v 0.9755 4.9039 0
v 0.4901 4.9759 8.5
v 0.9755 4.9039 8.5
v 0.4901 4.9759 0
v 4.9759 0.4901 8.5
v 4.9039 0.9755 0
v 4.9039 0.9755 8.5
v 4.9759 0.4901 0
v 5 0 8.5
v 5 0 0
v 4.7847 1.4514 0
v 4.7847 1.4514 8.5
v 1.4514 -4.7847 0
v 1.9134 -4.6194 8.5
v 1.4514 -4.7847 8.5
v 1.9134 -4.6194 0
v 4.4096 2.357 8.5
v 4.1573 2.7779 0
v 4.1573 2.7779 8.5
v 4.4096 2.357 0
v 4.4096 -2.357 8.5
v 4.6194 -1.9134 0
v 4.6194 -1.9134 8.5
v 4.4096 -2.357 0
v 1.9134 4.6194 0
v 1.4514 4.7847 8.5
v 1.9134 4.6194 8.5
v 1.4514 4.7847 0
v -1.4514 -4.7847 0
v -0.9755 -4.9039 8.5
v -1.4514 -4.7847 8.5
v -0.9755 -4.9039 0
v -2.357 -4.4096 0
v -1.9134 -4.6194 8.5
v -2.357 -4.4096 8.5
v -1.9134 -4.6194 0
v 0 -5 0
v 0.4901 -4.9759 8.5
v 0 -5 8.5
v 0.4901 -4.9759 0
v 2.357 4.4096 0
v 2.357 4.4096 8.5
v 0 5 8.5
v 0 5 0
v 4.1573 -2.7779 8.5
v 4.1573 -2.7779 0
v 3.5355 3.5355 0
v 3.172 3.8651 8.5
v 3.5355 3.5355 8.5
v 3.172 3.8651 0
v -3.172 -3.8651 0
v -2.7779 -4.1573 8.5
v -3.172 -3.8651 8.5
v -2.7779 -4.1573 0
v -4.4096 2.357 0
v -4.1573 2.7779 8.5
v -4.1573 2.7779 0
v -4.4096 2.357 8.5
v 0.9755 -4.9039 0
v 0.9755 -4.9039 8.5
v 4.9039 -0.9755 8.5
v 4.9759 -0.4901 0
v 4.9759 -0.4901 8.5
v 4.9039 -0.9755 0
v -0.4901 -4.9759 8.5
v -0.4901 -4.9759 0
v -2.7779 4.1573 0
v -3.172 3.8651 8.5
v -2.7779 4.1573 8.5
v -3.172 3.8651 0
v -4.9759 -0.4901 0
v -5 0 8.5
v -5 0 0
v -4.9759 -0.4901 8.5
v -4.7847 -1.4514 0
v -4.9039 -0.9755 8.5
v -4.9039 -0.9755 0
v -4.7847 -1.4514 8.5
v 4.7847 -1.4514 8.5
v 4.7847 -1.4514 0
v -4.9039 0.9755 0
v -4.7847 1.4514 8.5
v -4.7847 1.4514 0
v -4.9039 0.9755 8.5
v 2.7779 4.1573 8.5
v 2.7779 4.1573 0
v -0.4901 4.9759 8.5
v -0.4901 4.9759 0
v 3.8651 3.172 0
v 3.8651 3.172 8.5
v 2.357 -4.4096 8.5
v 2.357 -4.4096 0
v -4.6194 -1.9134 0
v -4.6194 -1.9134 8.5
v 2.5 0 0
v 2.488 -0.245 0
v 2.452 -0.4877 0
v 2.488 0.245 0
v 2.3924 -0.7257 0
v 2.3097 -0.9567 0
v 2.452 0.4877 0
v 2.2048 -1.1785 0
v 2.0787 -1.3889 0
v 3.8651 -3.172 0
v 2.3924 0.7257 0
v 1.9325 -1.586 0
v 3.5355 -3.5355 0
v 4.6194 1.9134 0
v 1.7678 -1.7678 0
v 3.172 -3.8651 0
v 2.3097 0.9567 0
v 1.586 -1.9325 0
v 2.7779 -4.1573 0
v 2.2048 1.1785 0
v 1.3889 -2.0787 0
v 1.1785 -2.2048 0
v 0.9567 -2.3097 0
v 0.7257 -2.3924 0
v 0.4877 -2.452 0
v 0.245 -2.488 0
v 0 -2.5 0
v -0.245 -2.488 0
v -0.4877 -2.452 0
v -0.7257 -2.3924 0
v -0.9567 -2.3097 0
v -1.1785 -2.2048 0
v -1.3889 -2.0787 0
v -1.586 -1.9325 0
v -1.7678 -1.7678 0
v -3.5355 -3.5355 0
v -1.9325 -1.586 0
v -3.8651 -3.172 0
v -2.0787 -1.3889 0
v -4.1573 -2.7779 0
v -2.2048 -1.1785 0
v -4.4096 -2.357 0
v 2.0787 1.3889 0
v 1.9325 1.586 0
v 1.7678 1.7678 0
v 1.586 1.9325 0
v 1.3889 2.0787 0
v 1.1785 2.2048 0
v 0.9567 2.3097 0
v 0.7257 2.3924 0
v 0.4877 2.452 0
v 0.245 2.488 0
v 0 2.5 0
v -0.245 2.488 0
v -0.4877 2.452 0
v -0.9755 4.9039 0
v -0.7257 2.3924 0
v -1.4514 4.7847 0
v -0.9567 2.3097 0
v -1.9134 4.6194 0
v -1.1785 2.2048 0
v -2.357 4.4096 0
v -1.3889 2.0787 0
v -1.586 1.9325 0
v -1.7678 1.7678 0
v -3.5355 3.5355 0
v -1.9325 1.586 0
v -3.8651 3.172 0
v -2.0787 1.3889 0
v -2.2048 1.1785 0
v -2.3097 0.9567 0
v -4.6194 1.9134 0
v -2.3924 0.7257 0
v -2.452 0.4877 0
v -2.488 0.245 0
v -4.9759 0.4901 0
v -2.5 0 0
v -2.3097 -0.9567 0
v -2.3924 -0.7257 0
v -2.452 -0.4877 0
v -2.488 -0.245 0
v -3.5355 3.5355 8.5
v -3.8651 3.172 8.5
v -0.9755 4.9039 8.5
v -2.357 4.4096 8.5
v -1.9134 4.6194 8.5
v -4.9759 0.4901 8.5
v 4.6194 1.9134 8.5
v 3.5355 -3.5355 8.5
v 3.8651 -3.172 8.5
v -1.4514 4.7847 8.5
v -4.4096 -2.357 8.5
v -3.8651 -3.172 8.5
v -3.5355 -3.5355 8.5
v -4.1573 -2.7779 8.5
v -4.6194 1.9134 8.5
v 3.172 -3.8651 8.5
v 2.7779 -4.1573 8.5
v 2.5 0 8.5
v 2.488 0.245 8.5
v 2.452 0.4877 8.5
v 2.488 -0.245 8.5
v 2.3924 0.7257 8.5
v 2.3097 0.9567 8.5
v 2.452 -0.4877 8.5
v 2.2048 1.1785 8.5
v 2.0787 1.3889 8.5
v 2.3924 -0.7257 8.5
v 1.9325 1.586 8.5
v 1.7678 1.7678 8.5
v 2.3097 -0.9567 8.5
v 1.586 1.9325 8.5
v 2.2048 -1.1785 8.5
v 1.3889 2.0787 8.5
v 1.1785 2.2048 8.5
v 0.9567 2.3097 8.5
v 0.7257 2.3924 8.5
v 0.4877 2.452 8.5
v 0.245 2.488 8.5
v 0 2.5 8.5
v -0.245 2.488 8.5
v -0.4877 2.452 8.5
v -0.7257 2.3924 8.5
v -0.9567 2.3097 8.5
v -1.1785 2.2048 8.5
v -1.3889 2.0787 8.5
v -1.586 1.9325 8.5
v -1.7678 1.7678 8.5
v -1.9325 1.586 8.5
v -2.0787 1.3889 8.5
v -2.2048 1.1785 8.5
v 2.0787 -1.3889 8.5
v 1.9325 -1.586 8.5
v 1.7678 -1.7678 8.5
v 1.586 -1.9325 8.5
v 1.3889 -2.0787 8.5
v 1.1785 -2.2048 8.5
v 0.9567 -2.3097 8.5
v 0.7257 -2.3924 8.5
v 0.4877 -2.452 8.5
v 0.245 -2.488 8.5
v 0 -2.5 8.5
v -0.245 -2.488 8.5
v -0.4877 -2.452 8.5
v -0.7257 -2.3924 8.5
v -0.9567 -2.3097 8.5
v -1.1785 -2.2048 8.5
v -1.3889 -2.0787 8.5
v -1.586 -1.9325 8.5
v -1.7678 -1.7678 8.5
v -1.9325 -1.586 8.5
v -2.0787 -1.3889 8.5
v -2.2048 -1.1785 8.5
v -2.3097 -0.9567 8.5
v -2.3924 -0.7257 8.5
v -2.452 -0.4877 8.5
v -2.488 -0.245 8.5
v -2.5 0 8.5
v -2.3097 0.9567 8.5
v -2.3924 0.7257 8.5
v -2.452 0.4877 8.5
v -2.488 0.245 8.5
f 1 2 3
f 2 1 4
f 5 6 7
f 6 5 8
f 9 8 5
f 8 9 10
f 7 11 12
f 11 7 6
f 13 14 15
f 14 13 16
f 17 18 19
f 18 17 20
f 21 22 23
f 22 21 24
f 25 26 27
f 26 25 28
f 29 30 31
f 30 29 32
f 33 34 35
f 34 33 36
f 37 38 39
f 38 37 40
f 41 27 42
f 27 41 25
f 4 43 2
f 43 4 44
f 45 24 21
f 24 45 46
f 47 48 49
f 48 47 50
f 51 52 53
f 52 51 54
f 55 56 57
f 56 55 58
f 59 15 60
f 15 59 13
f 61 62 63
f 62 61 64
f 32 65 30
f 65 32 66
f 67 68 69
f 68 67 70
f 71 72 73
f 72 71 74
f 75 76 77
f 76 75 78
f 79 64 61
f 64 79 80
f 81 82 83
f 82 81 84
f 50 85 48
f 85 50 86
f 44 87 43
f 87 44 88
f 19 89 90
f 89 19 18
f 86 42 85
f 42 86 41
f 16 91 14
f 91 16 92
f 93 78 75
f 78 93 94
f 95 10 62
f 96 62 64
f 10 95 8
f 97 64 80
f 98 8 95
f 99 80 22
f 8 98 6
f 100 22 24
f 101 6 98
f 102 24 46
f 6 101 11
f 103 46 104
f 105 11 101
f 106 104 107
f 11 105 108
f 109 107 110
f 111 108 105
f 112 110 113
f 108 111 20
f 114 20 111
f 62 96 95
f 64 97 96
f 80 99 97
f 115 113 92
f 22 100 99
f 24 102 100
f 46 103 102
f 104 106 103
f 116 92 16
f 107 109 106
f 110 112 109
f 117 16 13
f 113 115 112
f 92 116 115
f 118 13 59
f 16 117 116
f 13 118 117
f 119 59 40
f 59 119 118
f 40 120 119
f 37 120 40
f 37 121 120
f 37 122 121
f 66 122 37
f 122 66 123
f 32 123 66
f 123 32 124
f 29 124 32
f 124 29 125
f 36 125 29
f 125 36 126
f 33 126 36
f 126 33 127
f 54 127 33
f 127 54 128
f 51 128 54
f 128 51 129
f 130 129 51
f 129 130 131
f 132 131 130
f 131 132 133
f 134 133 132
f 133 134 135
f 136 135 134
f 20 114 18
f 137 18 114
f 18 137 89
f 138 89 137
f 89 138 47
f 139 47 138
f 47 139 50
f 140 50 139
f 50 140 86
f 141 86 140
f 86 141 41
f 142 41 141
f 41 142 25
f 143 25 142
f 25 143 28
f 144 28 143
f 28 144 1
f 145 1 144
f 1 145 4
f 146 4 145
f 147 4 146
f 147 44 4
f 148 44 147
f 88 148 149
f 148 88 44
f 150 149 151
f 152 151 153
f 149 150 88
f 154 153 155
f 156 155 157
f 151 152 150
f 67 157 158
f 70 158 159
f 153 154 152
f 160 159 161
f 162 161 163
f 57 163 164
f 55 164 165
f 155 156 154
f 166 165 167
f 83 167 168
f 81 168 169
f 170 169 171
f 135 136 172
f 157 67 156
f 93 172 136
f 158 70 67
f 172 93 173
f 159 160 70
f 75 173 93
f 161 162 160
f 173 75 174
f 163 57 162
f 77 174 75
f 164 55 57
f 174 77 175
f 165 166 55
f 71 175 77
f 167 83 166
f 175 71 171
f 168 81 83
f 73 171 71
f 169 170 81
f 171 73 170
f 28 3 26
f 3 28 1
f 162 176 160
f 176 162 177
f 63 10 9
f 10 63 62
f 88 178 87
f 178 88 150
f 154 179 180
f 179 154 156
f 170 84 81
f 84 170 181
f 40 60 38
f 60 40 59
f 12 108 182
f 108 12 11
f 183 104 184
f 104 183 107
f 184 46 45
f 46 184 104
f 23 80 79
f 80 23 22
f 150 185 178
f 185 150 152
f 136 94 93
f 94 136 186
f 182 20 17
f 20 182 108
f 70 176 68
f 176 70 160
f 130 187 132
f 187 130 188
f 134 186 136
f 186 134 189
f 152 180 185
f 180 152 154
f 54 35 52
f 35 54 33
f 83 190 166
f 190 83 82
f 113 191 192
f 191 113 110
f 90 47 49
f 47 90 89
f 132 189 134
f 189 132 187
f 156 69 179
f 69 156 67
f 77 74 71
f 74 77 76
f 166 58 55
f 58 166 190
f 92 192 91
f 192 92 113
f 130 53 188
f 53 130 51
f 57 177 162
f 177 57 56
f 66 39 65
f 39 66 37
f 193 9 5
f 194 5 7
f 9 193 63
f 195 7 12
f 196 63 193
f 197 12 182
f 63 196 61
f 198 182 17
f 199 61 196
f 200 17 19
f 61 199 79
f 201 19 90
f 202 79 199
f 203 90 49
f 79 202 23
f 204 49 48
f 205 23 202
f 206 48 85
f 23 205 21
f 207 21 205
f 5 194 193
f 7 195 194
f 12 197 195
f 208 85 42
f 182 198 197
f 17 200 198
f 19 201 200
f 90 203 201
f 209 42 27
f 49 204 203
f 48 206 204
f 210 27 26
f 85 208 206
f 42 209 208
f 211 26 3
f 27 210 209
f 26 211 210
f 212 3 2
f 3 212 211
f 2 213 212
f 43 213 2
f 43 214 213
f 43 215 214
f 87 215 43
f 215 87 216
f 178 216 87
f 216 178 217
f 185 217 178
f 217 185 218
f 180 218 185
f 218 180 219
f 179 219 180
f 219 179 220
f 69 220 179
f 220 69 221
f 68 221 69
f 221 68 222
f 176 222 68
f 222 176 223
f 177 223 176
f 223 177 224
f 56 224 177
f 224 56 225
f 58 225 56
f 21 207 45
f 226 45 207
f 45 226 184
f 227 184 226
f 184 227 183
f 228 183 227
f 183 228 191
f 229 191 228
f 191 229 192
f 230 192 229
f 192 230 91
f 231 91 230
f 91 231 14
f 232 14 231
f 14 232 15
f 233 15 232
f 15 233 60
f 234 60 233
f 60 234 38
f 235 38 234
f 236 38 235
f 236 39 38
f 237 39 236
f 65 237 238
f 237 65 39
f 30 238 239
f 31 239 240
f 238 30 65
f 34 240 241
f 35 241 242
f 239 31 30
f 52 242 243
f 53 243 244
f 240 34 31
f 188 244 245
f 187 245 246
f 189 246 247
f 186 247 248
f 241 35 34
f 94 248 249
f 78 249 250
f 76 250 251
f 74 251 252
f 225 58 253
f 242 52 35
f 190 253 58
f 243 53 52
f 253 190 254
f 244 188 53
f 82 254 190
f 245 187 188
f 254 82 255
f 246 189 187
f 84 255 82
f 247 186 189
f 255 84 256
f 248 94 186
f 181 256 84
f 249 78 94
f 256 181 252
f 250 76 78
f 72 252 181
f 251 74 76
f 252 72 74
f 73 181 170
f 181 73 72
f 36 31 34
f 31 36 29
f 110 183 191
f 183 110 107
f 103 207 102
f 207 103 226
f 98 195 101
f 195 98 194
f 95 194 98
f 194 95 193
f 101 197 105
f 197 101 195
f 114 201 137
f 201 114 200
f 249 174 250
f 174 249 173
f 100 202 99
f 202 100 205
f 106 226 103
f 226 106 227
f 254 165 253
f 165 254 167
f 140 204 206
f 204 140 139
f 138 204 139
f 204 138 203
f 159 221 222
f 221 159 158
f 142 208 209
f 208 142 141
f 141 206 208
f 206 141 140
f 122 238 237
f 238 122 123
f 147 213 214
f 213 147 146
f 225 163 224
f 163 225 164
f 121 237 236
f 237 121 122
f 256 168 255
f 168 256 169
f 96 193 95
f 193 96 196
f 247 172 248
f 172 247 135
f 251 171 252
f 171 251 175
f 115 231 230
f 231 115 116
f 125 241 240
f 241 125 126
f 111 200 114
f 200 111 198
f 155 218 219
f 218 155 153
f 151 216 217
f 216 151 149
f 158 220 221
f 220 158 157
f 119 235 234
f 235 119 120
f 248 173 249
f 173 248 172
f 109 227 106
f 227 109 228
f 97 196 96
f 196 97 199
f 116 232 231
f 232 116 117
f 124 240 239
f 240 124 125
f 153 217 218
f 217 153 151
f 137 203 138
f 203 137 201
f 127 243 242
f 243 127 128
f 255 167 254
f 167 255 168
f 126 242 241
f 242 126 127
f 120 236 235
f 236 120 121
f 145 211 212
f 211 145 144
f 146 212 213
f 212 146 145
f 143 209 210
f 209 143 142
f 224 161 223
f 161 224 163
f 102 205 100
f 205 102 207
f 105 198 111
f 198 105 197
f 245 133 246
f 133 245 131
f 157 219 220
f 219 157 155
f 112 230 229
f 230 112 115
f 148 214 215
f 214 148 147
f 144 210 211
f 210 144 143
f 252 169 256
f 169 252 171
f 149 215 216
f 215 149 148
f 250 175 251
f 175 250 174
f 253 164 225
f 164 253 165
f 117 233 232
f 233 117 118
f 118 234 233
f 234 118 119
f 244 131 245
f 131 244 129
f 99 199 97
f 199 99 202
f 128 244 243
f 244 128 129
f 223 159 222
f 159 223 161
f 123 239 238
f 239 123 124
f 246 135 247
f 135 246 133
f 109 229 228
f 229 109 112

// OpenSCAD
DIM_X = 87;
DIM_Y = 95.1;
DIM_Z = 3;
EDGE = 5;
SCREW_Z = 8;
SCREW_DIAM = 3;
SCREW_INSET = 2.5;
BIG_SCREW_DIAM = 5;

CUBE_SIZE = 10;

module frame() {
    union() {
        difference() {
            cube([DIM_X, DIM_Y, DIM_Z], center=true);
            cube([DIM_X - (2*EDGE), DIM_Y - (2*EDGE), DIM_Z], center=true);
            for(ox=[-1:2:2]) {
                for(oy=[-1:2:2]) {       
                    translate([ox * ((0.5 * DIM_X) - SCREW_INSET), oy * ((0.5 * DIM_Y) - SCREW_INSET), -0.5 * DIM_Z]) cylinder(d=SCREW_DIAM, h=DIM_Z, $fn=64);
                }
            }
        }

        for(ox=[-1:2:2]) {
            for(oy=[-1:2:2]) {  
                translate([ox * (0.5 * (CUBE_SIZE + DIM_X)), oy * (0.5 * (DIM_Y - CUBE_SIZE)), -1]) {
                    difference() {
                        union() {
                            translate([0, 0, 1]) cube([CUBE_SIZE, CUBE_SIZE, DIM_Z], center=true);
                            translate([0, 0, -1 * (SCREW_Z - DIM_Z)]) cylinder(d=CUBE_SIZE, h=SCREW_Z - DIM_Z, $fn=64);
                        }
                        translate([0, 0, -0.5 * (SCREW_Z + DIM_Z)]) cylinder(d=BIG_SCREW_DIAM, h=SCREW_Z, $fn=64);
                    }
                }
            }
        }
    }

}

module standoff() {
    STANDOFF_HEIGHT = 8.5;
    difference() {
        cylinder(d=CUBE_SIZE, h=STANDOFF_HEIGHT, $fn=64);
        cylinder(d=BIG_SCREW_DIAM, h=STANDOFF_HEIGHT, $fn=64);
    }
}

standoff();
